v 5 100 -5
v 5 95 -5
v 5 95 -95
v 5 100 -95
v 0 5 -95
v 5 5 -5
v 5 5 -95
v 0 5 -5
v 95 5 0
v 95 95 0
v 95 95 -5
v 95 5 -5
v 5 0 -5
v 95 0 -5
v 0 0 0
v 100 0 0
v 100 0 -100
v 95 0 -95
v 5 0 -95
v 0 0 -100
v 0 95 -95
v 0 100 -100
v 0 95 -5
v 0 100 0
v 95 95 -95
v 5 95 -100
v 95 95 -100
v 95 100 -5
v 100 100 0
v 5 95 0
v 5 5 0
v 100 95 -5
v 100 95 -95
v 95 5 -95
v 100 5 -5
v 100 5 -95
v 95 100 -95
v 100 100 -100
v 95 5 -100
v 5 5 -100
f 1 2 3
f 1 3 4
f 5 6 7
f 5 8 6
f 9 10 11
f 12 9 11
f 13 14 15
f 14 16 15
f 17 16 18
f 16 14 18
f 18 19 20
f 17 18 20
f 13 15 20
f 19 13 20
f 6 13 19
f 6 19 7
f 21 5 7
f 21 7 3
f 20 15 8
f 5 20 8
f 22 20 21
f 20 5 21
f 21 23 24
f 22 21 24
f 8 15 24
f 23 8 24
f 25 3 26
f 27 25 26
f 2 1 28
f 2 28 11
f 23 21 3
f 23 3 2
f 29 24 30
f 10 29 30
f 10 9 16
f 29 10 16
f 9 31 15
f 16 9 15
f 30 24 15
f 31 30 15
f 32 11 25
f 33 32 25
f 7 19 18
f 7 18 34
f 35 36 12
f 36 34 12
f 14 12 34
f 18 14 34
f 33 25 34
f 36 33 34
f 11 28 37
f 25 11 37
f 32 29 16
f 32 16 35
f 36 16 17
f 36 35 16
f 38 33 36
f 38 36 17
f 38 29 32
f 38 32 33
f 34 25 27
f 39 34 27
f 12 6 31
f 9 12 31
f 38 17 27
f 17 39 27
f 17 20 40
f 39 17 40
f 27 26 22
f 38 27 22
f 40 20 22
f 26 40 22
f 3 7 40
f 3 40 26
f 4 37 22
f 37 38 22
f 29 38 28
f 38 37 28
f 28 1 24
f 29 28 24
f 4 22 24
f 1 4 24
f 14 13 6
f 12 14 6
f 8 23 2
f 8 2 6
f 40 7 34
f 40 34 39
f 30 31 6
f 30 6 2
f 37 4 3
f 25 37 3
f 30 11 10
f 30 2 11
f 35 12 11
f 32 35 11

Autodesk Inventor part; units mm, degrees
ref_plane "YZ Plane" through (0, 0, 0) normal (1, 0, 0) x (0, 1, 0)
ref_plane "XZ Plane" through (0, 0, 0) normal (0, 1, 0) x (-1, 0, 0)
ref_plane "XY Plane" through (0, 0, 0) normal (0, 0, 1) x (1, 0, 0)
sketch "Szkic1" plane through (0, 0, 0) normal (1, 0, 0) x (0, 1, 0)
  line L0 (0, 0) -> (100, 0)
  line L1 (100, 0) -> (100, -100)
  line L2 (100, -100) -> (0, -100)
  line L3 (0, -100) -> (0, 0)
  line L4 (95, -95) -> (95, -5)
  line L5 (95, -5) -> (5, -5)
  line L6 (5, -5) -> (5, -95)
  line L7 (5, -95) -> (95, -95)
  dimension "d0" = 100
  dimension "d1" = 100
  dimension "d2" = 5
extrude "Wyciągnięcie proste1" add sketch "Szkic1" along normal blind 5
sketch "Szkic2" plane through (5, 0, 0) normal (1, 0, 0) x (0, 0, -1)
  line L0 (100, 0) -> (100, 100) projected
  line L1 (100, 100) -> (0, 100) projected
  line L2 (0, 100) -> (0, 0) projected
  line L3 (0, 0) -> (100, 0) projected
  line L4 (95, 95) -> (95, 5) projected
  line L5 (95, 5) -> (5, 5) projected
  line L6 (5, 5) -> (5, 95) projected
  line L7 (5, 95) -> (95, 95) projected
  line L8 (0, 100) -> (5, 100)
  line L9 (5, 100) -> (5, 95)
  line L10 (5, 95) -> (0, 95)
  line L11 (0, 95) -> (0, 100)
  line L12 (5, 95) -> (95, 95) projected
  line L13 (100, 100) -> (95, 100)
  line L14 (95, 100) -> (95, 95)
  line L15 (95, 95) -> (100, 95)
  line L16 (100, 95) -> (100, 100)
  line L17 (95, 95) -> (95, 5) projected
  line L18 (95, 5) -> (100, 5)
  line L19 (100, 5) -> (100, 0)
  line L20 (100, 0) -> (95, 0)
  line L21 (95, 0) -> (95, 5)
  line L22 (5, 5) -> (5, 95) projected
  line L23 (0, 100) -> (0, 0) projected
  line L24 (5, 5) -> (0, 5)
  line L25 (0, 5) -> (0, 0)
  line L26 (0, 0) -> (5, 0)
  line L27 (5, 0) -> (5, 5)
extrude "Wyciągnięcie proste2" add sketch "Szkic2" along normal blind 90 contours L3 L21 L18 L0 | L15 L14 L1 L0 | L3 L2 L24 L27 | L10 L2 L1 L9
sketch "Szkic3" plane through (95, 0, 0) normal (1, 0, 0) x (0, 0, -1)
  line L0 (100, 0) -> (100, 100) projected
  line L1 (0, 0) -> (100, 0) projected
  line L2 (0, 100) -> (0, 0) projected
  line L3 (100, 100) -> (0, 100) projected
  line L4 (95, 95) -> (95, 5) projected
  line L5 (5, 95) -> (95, 95) projected
  line L6 (5, 5) -> (5, 95) projected
  line L7 (95, 5) -> (5, 5) projected
extrude "Wyciągnięcie proste3" add sketch "Szkic3" along normal blind 5
properties part number "wymiar"
